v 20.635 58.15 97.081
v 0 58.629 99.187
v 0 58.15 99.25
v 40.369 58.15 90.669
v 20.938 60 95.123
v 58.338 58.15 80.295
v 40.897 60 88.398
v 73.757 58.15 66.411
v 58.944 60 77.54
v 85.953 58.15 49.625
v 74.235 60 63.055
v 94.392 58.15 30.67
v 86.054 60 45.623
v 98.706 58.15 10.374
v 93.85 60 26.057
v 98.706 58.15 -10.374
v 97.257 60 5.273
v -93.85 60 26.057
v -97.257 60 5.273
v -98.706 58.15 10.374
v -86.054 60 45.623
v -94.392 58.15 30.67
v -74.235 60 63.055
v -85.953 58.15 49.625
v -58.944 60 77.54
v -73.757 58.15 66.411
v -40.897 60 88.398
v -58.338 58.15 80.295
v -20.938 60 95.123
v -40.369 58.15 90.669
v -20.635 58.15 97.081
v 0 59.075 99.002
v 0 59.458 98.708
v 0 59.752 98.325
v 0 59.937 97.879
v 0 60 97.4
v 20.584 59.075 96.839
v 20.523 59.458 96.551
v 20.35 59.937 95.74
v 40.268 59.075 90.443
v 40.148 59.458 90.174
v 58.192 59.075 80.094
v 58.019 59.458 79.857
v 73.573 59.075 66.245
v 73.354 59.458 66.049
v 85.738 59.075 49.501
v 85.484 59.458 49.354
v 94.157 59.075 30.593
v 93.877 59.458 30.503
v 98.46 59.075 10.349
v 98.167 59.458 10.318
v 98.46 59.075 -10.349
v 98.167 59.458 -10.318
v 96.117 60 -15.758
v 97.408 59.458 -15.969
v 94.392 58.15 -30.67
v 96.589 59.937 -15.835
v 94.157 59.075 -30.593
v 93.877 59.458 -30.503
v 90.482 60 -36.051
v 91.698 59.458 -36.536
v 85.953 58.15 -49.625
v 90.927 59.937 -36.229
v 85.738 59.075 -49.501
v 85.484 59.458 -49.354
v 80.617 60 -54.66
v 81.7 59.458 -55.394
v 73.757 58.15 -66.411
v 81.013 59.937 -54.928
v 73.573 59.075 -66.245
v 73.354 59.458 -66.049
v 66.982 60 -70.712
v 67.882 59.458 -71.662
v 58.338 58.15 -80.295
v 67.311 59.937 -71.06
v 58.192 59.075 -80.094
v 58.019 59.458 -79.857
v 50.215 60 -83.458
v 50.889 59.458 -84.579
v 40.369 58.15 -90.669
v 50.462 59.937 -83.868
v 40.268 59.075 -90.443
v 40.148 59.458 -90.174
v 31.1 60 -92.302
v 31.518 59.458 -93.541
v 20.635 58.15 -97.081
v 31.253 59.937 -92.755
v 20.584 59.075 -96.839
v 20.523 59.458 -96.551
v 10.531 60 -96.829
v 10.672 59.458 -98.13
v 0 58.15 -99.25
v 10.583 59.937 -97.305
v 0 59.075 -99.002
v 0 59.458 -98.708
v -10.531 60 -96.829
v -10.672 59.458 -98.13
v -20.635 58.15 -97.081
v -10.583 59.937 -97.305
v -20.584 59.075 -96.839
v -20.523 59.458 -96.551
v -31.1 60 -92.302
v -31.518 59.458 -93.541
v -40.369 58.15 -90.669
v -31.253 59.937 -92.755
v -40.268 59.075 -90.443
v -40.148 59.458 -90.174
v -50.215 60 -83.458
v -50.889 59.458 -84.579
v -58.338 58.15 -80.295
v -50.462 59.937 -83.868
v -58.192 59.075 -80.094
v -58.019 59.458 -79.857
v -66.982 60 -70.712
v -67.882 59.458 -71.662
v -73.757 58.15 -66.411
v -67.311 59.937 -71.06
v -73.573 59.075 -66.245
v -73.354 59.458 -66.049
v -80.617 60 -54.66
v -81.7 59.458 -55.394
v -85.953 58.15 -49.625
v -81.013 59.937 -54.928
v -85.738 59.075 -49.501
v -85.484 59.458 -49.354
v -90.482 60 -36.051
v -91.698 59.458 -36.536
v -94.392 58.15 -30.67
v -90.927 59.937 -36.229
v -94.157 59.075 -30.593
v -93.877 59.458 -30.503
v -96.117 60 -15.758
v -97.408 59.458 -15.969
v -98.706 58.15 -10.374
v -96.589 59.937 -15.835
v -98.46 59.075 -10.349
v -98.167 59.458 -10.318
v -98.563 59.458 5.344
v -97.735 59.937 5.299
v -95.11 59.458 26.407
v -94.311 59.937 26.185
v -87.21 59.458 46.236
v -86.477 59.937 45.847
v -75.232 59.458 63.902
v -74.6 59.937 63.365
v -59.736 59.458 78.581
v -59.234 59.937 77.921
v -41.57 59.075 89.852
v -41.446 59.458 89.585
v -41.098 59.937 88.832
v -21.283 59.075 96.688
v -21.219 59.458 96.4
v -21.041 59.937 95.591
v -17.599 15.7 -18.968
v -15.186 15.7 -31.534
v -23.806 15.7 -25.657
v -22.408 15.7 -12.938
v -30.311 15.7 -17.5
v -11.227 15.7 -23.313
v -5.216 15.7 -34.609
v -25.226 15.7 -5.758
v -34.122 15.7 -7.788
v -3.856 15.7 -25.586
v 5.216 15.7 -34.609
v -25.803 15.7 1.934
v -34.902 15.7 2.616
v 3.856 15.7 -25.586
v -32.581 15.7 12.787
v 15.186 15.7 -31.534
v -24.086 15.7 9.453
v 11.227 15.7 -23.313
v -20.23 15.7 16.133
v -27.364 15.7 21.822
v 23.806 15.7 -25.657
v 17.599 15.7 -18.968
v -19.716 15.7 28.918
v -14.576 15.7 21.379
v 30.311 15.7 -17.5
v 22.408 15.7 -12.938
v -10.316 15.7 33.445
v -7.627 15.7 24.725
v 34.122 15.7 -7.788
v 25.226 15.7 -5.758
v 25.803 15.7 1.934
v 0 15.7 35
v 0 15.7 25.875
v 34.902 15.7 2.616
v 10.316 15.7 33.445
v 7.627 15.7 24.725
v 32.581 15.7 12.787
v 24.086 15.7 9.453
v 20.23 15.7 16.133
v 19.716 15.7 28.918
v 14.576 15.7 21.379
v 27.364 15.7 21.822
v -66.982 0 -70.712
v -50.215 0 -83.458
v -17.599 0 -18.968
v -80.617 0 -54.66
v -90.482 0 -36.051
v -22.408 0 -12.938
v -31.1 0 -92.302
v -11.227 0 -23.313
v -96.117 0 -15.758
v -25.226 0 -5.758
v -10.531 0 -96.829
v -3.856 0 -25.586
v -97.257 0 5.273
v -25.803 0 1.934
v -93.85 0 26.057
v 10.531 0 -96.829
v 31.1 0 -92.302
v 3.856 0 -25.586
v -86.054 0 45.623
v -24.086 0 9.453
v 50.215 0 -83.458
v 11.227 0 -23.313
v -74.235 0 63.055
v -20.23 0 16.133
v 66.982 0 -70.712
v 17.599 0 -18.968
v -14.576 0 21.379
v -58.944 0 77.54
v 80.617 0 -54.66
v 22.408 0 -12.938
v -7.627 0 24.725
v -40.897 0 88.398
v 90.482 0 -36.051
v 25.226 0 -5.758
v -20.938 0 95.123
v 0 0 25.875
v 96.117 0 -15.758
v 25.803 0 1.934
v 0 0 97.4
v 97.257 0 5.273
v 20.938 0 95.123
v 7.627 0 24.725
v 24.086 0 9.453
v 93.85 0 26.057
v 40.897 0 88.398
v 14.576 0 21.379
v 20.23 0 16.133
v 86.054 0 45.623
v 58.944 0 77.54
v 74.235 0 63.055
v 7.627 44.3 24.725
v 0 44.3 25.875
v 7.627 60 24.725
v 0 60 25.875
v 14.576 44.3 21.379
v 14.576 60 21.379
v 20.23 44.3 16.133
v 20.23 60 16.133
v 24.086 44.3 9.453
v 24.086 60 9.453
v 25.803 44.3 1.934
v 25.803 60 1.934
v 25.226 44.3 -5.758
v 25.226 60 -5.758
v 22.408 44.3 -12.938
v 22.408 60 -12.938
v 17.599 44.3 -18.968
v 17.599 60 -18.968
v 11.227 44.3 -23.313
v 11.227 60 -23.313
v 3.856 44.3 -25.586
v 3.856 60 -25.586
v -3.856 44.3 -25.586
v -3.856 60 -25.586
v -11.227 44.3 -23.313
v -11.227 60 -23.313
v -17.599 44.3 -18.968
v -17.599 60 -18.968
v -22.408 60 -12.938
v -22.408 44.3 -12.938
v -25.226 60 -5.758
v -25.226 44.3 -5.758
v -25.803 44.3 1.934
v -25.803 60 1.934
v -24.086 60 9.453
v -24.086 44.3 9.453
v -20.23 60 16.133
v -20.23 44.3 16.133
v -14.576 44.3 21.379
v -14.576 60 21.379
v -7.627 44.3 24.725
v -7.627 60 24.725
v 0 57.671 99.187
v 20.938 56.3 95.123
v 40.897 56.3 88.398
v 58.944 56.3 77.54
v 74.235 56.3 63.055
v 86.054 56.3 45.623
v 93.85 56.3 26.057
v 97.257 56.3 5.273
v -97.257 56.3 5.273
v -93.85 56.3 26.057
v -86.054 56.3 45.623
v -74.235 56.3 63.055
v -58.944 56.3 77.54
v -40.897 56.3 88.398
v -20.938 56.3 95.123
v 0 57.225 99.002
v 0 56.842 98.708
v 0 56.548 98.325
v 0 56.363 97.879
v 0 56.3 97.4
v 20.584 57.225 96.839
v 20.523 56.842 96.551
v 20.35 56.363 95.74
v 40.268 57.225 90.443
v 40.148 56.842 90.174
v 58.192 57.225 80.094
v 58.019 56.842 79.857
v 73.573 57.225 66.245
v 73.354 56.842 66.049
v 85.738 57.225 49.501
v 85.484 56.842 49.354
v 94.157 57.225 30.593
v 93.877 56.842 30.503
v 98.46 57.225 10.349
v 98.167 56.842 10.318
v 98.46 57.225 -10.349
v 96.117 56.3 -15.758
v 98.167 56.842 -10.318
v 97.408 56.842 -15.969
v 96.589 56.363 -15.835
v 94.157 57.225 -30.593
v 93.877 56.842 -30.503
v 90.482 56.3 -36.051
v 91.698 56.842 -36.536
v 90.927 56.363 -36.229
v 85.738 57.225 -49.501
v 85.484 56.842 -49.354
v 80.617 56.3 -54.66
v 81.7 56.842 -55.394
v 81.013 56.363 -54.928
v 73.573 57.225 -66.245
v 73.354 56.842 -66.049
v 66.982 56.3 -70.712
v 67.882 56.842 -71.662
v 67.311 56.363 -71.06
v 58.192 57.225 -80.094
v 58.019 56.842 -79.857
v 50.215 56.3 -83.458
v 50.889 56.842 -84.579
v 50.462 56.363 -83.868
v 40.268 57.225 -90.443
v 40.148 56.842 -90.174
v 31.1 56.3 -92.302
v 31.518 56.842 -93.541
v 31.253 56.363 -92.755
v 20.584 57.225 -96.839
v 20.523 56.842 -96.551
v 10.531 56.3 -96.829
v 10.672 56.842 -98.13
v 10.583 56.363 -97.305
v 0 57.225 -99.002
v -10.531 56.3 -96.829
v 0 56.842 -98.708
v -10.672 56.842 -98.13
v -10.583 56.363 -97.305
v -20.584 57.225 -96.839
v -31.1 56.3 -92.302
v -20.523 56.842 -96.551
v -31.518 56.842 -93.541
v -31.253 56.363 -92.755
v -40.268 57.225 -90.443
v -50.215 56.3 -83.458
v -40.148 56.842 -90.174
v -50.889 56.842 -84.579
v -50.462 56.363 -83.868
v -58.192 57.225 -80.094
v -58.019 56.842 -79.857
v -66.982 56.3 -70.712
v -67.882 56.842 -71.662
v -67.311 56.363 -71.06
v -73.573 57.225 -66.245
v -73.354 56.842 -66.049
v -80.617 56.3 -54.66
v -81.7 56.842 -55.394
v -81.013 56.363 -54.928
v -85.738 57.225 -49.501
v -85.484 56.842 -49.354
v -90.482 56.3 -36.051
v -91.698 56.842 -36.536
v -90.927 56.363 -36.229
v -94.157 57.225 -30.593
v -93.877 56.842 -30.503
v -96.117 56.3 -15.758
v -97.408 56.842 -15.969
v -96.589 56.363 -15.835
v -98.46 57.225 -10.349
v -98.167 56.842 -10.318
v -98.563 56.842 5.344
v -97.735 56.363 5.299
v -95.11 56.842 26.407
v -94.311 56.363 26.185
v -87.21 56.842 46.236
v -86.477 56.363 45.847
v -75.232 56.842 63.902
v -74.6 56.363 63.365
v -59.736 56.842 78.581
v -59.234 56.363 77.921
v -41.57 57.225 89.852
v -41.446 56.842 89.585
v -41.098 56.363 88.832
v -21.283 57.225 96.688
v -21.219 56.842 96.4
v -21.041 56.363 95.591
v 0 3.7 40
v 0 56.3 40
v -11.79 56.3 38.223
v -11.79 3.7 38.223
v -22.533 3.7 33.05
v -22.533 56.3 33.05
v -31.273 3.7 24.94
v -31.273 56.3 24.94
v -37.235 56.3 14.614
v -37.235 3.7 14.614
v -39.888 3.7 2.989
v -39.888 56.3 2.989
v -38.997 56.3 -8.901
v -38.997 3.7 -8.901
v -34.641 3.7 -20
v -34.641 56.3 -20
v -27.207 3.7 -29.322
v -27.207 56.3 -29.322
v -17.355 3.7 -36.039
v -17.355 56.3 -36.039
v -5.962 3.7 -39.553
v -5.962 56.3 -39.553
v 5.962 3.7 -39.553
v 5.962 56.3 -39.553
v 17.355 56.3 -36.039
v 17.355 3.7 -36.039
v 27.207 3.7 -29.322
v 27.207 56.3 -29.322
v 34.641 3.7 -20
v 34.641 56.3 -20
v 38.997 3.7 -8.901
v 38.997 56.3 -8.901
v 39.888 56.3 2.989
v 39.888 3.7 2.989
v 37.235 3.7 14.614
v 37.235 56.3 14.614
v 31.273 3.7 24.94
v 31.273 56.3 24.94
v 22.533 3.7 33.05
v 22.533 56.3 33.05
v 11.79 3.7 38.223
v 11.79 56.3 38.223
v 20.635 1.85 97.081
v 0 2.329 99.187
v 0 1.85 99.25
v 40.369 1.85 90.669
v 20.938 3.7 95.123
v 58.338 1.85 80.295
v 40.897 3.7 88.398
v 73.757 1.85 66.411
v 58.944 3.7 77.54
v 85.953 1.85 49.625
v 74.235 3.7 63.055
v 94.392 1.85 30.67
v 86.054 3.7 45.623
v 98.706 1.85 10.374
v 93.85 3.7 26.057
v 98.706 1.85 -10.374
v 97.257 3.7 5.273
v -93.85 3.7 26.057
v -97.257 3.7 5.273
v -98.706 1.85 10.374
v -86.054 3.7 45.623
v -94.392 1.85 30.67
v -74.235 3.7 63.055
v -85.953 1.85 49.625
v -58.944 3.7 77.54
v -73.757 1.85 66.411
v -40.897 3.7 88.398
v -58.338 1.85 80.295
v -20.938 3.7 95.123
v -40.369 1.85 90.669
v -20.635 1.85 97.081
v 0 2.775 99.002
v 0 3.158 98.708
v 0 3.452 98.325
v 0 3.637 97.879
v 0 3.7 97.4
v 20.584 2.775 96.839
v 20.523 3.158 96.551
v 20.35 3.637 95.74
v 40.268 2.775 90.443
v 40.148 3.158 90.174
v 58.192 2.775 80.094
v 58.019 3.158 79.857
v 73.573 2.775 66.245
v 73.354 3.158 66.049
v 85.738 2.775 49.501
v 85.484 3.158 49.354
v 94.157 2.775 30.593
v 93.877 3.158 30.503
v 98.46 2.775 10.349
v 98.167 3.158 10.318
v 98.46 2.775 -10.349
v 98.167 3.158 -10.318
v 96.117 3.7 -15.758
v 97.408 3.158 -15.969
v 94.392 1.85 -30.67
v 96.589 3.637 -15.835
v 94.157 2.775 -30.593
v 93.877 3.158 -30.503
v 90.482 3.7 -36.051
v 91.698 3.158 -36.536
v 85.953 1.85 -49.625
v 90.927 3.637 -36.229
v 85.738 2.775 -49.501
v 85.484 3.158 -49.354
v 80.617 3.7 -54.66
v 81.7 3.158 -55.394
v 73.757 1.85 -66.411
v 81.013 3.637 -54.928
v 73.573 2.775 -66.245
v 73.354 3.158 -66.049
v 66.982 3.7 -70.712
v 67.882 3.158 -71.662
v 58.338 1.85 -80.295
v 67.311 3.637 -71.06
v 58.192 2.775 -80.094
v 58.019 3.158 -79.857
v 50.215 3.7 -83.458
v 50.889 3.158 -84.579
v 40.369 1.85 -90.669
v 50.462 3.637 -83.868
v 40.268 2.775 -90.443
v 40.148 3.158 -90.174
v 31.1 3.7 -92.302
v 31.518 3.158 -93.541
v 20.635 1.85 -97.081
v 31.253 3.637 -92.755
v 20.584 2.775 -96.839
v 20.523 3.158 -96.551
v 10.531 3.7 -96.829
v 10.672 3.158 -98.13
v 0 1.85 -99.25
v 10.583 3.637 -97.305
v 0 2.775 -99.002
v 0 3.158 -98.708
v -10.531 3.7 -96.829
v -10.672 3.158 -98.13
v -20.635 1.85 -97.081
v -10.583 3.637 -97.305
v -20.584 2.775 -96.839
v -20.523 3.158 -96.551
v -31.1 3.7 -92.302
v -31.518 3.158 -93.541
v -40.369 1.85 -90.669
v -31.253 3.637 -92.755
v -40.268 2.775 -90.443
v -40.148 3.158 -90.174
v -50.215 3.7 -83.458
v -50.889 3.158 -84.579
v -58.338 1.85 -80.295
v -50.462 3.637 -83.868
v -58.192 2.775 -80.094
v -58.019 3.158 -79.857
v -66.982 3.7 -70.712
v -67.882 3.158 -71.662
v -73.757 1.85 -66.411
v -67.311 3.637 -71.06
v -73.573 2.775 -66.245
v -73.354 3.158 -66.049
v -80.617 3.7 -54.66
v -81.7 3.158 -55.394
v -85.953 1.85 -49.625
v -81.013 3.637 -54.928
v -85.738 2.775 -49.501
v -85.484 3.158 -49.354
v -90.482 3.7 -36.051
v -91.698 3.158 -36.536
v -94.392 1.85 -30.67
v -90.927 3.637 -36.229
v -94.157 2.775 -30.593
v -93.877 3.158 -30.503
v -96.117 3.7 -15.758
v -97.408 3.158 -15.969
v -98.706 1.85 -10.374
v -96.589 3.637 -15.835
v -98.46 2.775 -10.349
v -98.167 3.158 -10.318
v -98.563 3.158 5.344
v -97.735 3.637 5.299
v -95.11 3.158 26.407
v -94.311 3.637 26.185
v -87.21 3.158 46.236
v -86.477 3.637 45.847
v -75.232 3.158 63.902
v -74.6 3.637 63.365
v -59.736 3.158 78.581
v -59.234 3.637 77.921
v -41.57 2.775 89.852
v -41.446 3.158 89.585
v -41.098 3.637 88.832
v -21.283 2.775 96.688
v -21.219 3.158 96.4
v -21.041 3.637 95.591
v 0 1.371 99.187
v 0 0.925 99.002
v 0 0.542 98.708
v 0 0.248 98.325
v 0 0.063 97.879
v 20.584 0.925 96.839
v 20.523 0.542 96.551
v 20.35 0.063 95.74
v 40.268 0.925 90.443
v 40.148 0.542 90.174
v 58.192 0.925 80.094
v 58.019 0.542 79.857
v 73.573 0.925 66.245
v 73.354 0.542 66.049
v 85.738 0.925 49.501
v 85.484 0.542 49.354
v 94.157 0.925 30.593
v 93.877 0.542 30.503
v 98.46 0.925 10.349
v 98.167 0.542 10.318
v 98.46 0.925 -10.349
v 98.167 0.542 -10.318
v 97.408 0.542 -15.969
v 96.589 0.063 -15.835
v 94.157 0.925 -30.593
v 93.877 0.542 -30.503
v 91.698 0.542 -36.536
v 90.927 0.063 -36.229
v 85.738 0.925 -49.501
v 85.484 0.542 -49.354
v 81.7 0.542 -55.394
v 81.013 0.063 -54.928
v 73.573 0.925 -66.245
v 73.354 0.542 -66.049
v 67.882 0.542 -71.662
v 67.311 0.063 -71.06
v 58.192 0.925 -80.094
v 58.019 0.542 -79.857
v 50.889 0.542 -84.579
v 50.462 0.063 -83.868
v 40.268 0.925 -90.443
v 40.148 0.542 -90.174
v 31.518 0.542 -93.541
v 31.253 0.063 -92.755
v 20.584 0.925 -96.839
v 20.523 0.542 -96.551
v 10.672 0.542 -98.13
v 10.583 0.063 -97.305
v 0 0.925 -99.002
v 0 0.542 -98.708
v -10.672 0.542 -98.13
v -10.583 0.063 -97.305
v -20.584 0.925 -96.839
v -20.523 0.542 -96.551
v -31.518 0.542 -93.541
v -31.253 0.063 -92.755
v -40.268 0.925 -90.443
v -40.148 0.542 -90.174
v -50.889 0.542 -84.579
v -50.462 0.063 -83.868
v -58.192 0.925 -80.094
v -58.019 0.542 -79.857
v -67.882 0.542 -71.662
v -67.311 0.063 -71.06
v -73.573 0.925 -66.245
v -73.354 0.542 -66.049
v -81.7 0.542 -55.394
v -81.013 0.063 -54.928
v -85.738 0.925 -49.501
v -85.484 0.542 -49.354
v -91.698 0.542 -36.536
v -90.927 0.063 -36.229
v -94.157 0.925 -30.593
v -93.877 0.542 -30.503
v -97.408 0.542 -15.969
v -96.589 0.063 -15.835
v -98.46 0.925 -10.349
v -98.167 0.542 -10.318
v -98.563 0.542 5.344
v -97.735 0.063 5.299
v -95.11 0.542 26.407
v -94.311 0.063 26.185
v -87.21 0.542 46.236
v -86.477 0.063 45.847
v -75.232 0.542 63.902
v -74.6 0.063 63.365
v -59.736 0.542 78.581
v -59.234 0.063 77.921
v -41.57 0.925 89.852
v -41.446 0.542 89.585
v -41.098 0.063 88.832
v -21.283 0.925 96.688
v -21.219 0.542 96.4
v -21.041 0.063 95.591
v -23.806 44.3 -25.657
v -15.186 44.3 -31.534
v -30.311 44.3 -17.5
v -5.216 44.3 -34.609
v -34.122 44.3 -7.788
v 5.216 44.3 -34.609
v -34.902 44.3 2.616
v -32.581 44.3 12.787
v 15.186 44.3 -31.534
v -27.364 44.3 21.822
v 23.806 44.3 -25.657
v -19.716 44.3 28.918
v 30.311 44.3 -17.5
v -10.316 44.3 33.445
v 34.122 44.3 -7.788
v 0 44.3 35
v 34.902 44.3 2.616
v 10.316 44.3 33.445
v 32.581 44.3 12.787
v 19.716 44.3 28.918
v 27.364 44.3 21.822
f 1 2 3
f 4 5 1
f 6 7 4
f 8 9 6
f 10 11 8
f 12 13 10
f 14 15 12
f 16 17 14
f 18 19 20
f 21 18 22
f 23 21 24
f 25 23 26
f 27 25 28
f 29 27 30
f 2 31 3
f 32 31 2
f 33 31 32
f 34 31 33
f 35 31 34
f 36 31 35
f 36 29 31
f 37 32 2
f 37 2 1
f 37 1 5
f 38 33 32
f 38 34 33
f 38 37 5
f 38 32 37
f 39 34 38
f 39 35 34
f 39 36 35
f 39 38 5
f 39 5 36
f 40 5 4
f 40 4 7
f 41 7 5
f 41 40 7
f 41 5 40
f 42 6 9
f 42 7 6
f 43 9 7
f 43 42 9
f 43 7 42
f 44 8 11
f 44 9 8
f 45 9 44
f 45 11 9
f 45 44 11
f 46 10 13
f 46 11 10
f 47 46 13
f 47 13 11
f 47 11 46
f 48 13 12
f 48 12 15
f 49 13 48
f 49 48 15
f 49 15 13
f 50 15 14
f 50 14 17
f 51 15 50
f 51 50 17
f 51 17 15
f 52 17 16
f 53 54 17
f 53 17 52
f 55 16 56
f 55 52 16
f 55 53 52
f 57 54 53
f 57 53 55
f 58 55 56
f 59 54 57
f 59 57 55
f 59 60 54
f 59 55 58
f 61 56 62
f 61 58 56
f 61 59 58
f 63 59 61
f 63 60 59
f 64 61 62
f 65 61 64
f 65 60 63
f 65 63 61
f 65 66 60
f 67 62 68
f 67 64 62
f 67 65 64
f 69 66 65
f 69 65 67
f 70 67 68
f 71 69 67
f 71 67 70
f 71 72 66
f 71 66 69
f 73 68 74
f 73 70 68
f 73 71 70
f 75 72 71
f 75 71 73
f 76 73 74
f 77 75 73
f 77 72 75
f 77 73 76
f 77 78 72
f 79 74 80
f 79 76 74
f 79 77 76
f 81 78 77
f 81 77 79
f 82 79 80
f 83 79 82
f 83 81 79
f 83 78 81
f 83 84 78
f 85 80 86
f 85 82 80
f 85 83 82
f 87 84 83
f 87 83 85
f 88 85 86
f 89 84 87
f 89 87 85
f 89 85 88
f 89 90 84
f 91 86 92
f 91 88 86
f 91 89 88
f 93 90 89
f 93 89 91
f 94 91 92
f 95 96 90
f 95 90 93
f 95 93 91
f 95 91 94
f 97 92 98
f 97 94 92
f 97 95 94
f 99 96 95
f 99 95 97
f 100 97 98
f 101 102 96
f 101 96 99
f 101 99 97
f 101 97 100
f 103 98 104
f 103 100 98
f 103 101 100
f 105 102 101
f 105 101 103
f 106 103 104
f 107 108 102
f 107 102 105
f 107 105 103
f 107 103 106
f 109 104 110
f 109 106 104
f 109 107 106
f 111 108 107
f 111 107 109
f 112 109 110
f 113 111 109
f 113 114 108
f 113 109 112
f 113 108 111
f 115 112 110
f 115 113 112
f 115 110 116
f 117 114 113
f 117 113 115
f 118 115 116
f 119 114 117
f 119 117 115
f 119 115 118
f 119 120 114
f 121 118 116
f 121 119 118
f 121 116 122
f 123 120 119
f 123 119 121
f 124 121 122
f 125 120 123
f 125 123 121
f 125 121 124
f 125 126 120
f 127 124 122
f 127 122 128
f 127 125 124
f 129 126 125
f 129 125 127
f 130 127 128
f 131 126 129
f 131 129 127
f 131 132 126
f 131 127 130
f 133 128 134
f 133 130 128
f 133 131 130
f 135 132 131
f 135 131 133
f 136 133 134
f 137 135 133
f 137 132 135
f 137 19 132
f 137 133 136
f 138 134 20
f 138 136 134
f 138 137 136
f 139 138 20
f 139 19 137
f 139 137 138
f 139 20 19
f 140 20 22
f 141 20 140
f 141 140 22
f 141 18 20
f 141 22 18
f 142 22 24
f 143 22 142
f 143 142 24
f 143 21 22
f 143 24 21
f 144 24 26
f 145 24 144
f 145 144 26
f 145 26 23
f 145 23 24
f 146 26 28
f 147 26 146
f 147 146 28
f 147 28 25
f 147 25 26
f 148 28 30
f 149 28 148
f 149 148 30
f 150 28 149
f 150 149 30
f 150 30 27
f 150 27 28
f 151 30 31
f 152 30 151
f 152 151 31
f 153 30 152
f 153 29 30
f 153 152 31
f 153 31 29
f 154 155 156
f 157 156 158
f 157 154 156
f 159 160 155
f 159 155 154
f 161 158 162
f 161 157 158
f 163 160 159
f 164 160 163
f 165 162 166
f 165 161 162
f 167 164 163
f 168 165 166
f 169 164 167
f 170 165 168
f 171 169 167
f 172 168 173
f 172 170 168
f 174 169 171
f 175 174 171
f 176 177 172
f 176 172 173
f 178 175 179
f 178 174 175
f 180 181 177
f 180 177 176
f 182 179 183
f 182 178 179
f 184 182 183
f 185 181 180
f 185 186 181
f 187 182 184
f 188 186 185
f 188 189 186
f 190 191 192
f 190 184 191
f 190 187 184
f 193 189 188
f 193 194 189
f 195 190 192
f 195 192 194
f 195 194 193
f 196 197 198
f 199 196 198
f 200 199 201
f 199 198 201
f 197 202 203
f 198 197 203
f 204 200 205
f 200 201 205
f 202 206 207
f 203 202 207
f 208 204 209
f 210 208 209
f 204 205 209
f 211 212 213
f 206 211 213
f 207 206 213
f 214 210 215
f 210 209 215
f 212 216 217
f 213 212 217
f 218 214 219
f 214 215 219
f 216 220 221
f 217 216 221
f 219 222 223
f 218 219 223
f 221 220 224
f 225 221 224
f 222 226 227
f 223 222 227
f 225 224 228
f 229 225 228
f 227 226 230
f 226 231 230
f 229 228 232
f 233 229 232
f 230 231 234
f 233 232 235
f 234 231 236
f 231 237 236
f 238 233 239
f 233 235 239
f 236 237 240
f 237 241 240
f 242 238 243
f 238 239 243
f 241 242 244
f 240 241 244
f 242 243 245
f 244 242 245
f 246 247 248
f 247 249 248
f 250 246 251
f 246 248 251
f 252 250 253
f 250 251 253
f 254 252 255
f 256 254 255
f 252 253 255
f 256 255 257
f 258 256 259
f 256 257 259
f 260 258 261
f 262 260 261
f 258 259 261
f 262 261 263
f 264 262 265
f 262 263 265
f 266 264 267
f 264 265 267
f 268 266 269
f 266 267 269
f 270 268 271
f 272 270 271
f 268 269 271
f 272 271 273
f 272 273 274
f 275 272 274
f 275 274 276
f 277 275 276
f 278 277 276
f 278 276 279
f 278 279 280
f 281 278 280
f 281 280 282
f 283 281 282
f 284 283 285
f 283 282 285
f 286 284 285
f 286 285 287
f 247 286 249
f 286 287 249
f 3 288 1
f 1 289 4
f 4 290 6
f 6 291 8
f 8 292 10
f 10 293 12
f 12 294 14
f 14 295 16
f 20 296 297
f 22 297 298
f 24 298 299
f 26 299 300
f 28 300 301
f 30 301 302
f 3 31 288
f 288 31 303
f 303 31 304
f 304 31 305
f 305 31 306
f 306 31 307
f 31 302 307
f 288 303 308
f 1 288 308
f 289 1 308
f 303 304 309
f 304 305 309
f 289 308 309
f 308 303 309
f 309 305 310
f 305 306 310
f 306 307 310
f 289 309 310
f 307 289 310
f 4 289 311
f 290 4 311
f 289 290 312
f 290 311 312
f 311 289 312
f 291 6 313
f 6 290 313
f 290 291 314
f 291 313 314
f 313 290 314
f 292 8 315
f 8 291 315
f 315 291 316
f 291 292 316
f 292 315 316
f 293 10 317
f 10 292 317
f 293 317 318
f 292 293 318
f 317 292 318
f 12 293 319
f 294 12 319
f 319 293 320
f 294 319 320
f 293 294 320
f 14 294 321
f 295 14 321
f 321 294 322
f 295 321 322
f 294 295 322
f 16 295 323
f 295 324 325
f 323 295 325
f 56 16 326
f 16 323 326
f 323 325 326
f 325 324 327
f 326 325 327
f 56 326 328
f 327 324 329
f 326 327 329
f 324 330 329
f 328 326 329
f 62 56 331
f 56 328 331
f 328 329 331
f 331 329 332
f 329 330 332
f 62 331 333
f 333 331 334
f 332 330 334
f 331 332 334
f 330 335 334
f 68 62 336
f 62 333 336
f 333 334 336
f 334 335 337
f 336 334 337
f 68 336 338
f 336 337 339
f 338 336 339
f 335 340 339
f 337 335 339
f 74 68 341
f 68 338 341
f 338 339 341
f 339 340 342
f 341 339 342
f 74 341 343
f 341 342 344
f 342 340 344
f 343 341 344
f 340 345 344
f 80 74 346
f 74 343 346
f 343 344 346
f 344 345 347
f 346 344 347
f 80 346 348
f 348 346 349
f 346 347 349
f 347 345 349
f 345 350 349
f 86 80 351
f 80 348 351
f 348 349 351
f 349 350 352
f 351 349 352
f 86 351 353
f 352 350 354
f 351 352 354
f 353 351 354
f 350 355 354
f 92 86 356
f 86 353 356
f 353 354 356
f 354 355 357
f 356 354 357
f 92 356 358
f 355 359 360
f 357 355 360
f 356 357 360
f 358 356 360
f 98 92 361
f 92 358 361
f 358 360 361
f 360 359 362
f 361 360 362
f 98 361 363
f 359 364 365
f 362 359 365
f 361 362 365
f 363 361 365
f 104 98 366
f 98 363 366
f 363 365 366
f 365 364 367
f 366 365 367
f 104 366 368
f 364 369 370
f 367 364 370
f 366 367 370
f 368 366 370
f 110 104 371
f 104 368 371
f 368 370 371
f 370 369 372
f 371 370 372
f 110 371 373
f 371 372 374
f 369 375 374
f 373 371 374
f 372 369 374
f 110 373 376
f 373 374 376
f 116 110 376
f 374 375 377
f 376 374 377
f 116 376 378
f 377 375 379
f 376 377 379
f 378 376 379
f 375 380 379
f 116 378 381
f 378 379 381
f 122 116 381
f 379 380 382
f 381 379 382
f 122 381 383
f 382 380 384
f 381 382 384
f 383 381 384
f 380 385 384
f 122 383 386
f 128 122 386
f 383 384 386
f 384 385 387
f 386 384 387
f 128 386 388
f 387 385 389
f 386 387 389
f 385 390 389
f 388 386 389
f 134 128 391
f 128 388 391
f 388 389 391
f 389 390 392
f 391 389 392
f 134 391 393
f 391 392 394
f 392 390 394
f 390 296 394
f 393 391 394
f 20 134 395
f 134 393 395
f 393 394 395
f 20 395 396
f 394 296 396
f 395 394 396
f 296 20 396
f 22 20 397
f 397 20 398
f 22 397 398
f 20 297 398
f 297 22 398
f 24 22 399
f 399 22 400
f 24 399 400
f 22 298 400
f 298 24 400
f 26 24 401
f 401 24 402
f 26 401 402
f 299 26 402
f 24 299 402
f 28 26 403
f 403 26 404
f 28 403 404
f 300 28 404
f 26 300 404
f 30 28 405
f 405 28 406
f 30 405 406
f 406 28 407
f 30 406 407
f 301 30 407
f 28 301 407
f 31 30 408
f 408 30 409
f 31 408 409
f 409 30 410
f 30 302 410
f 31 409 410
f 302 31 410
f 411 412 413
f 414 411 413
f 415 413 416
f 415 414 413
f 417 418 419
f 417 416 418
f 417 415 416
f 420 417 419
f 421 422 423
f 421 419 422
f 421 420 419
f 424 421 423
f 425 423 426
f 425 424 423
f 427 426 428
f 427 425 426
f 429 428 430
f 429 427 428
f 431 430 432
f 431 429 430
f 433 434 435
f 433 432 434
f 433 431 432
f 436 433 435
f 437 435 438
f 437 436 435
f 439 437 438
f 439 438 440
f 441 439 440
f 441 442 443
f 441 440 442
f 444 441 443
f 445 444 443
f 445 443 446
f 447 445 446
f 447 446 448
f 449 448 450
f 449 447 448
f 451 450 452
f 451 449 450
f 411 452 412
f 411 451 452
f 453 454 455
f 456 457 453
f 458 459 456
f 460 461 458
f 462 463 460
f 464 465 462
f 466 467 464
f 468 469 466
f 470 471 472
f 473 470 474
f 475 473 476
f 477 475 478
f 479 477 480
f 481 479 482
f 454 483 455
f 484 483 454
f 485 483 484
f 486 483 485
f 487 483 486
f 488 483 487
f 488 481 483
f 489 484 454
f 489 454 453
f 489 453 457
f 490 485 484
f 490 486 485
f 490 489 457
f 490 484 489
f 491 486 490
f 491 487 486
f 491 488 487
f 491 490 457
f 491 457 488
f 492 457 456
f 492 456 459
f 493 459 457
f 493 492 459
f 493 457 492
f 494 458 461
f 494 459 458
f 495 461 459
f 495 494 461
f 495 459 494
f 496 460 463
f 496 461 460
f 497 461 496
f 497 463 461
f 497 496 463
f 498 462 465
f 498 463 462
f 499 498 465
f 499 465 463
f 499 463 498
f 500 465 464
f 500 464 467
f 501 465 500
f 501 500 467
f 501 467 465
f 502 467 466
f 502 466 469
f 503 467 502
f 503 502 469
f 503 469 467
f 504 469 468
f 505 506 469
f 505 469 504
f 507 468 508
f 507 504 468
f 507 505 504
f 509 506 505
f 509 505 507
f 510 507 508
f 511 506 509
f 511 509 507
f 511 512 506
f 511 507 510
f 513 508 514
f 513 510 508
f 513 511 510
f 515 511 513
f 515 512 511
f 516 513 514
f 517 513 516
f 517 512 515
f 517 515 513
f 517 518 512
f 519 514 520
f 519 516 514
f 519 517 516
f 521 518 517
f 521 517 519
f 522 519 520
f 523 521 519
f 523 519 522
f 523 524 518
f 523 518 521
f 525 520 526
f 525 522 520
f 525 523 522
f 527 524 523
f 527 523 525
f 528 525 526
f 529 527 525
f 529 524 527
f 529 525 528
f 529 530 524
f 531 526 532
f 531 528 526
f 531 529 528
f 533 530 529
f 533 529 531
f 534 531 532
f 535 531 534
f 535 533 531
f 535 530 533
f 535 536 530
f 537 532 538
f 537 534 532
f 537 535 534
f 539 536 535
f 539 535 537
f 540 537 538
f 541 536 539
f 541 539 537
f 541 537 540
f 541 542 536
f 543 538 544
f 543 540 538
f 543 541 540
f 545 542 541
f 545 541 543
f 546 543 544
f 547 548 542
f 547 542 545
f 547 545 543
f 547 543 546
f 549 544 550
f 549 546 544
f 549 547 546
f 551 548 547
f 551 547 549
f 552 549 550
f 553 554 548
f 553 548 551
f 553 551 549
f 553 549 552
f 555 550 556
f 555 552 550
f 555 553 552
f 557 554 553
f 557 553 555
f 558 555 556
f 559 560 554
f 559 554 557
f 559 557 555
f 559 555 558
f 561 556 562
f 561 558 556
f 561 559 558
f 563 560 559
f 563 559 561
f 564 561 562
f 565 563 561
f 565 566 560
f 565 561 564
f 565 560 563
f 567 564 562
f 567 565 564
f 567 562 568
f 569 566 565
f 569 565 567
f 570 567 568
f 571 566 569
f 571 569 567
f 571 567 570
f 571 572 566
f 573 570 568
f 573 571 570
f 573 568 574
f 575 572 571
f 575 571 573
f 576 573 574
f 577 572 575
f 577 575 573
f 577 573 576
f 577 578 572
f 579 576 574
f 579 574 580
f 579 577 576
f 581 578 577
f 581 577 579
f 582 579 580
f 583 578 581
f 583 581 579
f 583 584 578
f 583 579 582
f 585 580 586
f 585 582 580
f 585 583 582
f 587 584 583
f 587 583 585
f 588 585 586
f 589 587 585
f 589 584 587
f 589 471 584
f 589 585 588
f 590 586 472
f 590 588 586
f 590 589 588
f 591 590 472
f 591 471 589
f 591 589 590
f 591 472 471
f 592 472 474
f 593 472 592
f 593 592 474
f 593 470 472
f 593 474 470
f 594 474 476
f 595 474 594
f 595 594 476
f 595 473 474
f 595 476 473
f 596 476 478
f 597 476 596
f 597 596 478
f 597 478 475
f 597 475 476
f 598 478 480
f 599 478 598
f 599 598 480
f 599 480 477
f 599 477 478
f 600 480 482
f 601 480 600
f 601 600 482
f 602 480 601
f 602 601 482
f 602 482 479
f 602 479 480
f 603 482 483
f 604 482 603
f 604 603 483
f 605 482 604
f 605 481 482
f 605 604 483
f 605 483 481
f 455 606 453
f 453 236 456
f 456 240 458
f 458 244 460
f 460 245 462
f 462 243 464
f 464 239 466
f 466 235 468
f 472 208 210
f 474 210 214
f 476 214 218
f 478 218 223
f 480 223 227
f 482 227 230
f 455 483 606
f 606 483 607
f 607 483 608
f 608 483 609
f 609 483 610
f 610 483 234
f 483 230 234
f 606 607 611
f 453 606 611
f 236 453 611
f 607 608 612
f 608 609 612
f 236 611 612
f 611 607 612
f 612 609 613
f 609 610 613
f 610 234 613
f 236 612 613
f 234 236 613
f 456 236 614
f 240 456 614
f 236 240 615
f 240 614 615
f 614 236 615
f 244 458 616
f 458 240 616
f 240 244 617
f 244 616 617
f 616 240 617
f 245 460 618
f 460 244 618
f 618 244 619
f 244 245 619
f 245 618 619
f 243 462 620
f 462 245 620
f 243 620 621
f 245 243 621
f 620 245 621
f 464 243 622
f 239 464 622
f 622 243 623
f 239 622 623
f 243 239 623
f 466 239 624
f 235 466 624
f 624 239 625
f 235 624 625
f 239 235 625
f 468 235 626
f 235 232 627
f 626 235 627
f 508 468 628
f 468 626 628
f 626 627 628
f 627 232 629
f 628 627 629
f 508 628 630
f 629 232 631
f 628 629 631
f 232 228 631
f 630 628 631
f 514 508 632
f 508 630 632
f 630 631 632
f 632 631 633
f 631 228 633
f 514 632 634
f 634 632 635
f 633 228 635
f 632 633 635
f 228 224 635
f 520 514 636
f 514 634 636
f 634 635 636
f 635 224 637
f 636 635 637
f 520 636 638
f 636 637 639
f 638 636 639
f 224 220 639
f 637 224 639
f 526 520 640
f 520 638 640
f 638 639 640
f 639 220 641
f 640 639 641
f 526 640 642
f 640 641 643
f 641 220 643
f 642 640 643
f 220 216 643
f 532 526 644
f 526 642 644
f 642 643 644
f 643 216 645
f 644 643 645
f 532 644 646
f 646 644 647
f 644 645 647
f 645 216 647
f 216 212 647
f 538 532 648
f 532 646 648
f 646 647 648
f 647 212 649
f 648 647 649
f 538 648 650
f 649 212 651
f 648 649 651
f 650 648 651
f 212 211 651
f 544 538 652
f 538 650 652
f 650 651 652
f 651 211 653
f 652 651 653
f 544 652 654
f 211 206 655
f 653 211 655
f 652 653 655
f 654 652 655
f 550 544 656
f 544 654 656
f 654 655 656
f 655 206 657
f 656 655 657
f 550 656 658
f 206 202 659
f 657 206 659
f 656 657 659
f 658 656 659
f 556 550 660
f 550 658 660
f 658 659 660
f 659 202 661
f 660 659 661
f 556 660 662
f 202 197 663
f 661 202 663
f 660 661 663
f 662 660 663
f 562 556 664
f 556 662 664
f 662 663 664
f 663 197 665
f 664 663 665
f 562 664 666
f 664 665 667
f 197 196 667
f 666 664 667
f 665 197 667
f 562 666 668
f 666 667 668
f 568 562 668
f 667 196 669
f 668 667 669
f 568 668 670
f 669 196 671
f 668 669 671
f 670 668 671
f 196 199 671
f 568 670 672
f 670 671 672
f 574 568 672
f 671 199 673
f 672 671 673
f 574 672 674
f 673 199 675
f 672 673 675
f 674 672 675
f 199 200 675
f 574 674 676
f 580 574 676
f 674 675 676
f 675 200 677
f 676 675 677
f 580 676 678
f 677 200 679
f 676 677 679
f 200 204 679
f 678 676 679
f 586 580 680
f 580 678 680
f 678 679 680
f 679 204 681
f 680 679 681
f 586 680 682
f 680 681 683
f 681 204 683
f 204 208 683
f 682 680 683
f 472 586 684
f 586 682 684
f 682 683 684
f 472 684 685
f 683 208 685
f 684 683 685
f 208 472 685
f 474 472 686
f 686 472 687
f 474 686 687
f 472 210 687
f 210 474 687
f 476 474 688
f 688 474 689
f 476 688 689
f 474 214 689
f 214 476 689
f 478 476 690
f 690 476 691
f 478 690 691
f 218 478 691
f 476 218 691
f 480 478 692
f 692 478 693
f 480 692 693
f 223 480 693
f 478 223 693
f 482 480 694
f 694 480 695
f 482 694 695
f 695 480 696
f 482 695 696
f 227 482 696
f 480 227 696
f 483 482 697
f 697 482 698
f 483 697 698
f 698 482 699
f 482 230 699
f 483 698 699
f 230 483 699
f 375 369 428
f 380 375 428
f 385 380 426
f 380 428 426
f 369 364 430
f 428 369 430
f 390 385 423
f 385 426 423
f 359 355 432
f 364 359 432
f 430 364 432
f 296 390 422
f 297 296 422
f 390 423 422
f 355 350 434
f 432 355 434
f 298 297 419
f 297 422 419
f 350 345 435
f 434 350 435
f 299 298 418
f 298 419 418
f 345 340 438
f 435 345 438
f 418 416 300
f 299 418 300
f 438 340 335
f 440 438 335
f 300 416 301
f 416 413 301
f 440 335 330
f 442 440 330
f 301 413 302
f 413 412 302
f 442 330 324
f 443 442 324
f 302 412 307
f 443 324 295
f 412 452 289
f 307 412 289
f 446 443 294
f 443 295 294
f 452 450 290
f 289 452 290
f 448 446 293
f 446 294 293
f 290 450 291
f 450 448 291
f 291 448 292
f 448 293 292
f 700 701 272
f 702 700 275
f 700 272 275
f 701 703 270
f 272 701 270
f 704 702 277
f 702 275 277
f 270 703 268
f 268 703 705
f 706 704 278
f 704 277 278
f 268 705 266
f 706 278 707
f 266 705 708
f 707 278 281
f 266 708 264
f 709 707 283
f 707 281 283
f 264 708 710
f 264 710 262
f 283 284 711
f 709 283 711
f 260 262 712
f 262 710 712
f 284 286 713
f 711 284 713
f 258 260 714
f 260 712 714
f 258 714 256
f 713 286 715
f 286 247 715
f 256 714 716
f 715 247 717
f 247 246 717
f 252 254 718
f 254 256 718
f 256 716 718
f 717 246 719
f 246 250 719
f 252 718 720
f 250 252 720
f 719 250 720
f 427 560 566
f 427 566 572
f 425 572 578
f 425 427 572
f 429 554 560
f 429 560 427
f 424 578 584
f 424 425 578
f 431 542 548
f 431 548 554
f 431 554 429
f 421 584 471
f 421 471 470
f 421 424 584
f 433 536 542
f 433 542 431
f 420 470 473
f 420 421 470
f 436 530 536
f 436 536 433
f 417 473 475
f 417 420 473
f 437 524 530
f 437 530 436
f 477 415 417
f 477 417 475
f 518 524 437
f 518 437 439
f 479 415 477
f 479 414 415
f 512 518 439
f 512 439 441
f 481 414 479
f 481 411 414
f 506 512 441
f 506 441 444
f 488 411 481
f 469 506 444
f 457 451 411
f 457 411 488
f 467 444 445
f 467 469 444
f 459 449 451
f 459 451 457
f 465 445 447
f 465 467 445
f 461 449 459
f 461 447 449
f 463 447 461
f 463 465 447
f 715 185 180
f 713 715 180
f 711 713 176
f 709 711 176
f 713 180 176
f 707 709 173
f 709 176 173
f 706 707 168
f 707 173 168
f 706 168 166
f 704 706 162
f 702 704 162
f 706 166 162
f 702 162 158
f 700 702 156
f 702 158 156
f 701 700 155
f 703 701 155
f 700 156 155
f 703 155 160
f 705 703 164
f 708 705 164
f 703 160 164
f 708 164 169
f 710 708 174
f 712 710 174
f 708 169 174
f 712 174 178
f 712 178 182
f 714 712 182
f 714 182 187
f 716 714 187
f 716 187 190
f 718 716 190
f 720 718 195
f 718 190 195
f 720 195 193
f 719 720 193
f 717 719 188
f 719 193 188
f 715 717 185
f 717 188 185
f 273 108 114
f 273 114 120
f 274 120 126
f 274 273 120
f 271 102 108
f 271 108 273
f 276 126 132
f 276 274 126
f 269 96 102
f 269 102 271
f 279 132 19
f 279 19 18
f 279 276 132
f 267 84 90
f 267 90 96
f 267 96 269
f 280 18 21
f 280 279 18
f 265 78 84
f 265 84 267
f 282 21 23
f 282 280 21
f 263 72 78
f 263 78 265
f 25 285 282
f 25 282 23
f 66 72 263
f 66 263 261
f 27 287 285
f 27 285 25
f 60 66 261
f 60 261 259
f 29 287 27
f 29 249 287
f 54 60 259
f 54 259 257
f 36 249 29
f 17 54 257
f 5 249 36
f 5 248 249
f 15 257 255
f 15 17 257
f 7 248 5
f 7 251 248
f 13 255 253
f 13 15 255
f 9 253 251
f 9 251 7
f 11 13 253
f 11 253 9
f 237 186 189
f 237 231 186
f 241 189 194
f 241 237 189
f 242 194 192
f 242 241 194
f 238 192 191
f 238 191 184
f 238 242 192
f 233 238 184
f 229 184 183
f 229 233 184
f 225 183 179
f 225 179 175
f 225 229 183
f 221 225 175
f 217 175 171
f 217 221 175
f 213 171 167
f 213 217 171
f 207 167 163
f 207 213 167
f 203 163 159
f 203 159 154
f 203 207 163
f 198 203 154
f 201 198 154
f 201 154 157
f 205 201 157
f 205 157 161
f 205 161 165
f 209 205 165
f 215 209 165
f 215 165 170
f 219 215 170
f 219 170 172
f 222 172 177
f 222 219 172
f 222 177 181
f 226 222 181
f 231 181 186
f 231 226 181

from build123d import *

# Parameters (mm, degrees)
SKETCH1_R           = 99.25
SKETCH1_R_2         = 25.875
BOSS_EXTRUDE1_DEPTH = 3.7
FILLET1_R           = 1.85
SKETCH2_R           = 40
SKETCH2_R_2         = 25.875
BOSS_EXTRUDE2_DEPTH = 12
BOSS_EXTRUDE3_START = 28.6
SKETCH3_R           = 40
SKETCH3_R_2         = 35
BOSS_EXTRUDE3_DEPTH = 28.6


with BuildPart() as part:
    # Sketch1 → Boss-Extrude1 (new body)
    with BuildSketch(Plane(origin=(0, 0, 0), x_dir=(1, 0, 0), z_dir=(0, 1, 0))):
        with Locations(Location((0, 0, 0), (0, 0, 270))):
            Circle(SKETCH1_R)
        with Locations(Location((0, 0, 0), (0, 0, 270))):
            Circle(SKETCH1_R_2, mode=Mode.SUBTRACT)
    extrude(amount=BOSS_EXTRUDE1_DEPTH)

    # Fillet1
    fillet1_edges = [part.edges().sort_by_distance(p)[0] for p in [
        (0, 0, -99.25),
        (0, 3.7, -99.25),
    ]]
    fillet(fillet1_edges, radius=FILLET1_R - 0.0001)  # a hair under: the kernel refuses the full size

    # Sketch2 → Boss-Extrude2 (add)
    with BuildSketch(Plane(origin=(0, 3.7, 0), x_dir=(1, 0, 0), z_dir=(0, 1, 0))):
        with Locations(Location((0, 0, 0), (0, 0, 270))):
            Circle(SKETCH2_R)
        with Locations(Location((0, 0, 0), (0, 0, 270))):
            Circle(SKETCH2_R_2, mode=Mode.SUBTRACT)
    extrude(amount=BOSS_EXTRUDE2_DEPTH)


with BuildPart() as body_2:
    # Mirror2: mirrored copy
    add(part.part.mirror(Plane.ZX.offset(30)))


with BuildPart() as part_1:
    add(part.part)

    add(body_2.part)  # Boss-Extrude3 merges body 2
    # Sketch3 → Boss-Extrude3 (add)
    with BuildSketch(Plane.XZ.offset(-44.3).offset(BOSS_EXTRUDE3_START)):
        with Locations(Location((0, 0, 0), (0, 0, 90))):
            Circle(SKETCH3_R)
        with Locations(Location((0, 0, 0), (0, 0, 90))):
            Circle(SKETCH3_R_2, mode=Mode.SUBTRACT)
    extrude(amount=-BOSS_EXTRUDE3_DEPTH)


solid = part_1.part
